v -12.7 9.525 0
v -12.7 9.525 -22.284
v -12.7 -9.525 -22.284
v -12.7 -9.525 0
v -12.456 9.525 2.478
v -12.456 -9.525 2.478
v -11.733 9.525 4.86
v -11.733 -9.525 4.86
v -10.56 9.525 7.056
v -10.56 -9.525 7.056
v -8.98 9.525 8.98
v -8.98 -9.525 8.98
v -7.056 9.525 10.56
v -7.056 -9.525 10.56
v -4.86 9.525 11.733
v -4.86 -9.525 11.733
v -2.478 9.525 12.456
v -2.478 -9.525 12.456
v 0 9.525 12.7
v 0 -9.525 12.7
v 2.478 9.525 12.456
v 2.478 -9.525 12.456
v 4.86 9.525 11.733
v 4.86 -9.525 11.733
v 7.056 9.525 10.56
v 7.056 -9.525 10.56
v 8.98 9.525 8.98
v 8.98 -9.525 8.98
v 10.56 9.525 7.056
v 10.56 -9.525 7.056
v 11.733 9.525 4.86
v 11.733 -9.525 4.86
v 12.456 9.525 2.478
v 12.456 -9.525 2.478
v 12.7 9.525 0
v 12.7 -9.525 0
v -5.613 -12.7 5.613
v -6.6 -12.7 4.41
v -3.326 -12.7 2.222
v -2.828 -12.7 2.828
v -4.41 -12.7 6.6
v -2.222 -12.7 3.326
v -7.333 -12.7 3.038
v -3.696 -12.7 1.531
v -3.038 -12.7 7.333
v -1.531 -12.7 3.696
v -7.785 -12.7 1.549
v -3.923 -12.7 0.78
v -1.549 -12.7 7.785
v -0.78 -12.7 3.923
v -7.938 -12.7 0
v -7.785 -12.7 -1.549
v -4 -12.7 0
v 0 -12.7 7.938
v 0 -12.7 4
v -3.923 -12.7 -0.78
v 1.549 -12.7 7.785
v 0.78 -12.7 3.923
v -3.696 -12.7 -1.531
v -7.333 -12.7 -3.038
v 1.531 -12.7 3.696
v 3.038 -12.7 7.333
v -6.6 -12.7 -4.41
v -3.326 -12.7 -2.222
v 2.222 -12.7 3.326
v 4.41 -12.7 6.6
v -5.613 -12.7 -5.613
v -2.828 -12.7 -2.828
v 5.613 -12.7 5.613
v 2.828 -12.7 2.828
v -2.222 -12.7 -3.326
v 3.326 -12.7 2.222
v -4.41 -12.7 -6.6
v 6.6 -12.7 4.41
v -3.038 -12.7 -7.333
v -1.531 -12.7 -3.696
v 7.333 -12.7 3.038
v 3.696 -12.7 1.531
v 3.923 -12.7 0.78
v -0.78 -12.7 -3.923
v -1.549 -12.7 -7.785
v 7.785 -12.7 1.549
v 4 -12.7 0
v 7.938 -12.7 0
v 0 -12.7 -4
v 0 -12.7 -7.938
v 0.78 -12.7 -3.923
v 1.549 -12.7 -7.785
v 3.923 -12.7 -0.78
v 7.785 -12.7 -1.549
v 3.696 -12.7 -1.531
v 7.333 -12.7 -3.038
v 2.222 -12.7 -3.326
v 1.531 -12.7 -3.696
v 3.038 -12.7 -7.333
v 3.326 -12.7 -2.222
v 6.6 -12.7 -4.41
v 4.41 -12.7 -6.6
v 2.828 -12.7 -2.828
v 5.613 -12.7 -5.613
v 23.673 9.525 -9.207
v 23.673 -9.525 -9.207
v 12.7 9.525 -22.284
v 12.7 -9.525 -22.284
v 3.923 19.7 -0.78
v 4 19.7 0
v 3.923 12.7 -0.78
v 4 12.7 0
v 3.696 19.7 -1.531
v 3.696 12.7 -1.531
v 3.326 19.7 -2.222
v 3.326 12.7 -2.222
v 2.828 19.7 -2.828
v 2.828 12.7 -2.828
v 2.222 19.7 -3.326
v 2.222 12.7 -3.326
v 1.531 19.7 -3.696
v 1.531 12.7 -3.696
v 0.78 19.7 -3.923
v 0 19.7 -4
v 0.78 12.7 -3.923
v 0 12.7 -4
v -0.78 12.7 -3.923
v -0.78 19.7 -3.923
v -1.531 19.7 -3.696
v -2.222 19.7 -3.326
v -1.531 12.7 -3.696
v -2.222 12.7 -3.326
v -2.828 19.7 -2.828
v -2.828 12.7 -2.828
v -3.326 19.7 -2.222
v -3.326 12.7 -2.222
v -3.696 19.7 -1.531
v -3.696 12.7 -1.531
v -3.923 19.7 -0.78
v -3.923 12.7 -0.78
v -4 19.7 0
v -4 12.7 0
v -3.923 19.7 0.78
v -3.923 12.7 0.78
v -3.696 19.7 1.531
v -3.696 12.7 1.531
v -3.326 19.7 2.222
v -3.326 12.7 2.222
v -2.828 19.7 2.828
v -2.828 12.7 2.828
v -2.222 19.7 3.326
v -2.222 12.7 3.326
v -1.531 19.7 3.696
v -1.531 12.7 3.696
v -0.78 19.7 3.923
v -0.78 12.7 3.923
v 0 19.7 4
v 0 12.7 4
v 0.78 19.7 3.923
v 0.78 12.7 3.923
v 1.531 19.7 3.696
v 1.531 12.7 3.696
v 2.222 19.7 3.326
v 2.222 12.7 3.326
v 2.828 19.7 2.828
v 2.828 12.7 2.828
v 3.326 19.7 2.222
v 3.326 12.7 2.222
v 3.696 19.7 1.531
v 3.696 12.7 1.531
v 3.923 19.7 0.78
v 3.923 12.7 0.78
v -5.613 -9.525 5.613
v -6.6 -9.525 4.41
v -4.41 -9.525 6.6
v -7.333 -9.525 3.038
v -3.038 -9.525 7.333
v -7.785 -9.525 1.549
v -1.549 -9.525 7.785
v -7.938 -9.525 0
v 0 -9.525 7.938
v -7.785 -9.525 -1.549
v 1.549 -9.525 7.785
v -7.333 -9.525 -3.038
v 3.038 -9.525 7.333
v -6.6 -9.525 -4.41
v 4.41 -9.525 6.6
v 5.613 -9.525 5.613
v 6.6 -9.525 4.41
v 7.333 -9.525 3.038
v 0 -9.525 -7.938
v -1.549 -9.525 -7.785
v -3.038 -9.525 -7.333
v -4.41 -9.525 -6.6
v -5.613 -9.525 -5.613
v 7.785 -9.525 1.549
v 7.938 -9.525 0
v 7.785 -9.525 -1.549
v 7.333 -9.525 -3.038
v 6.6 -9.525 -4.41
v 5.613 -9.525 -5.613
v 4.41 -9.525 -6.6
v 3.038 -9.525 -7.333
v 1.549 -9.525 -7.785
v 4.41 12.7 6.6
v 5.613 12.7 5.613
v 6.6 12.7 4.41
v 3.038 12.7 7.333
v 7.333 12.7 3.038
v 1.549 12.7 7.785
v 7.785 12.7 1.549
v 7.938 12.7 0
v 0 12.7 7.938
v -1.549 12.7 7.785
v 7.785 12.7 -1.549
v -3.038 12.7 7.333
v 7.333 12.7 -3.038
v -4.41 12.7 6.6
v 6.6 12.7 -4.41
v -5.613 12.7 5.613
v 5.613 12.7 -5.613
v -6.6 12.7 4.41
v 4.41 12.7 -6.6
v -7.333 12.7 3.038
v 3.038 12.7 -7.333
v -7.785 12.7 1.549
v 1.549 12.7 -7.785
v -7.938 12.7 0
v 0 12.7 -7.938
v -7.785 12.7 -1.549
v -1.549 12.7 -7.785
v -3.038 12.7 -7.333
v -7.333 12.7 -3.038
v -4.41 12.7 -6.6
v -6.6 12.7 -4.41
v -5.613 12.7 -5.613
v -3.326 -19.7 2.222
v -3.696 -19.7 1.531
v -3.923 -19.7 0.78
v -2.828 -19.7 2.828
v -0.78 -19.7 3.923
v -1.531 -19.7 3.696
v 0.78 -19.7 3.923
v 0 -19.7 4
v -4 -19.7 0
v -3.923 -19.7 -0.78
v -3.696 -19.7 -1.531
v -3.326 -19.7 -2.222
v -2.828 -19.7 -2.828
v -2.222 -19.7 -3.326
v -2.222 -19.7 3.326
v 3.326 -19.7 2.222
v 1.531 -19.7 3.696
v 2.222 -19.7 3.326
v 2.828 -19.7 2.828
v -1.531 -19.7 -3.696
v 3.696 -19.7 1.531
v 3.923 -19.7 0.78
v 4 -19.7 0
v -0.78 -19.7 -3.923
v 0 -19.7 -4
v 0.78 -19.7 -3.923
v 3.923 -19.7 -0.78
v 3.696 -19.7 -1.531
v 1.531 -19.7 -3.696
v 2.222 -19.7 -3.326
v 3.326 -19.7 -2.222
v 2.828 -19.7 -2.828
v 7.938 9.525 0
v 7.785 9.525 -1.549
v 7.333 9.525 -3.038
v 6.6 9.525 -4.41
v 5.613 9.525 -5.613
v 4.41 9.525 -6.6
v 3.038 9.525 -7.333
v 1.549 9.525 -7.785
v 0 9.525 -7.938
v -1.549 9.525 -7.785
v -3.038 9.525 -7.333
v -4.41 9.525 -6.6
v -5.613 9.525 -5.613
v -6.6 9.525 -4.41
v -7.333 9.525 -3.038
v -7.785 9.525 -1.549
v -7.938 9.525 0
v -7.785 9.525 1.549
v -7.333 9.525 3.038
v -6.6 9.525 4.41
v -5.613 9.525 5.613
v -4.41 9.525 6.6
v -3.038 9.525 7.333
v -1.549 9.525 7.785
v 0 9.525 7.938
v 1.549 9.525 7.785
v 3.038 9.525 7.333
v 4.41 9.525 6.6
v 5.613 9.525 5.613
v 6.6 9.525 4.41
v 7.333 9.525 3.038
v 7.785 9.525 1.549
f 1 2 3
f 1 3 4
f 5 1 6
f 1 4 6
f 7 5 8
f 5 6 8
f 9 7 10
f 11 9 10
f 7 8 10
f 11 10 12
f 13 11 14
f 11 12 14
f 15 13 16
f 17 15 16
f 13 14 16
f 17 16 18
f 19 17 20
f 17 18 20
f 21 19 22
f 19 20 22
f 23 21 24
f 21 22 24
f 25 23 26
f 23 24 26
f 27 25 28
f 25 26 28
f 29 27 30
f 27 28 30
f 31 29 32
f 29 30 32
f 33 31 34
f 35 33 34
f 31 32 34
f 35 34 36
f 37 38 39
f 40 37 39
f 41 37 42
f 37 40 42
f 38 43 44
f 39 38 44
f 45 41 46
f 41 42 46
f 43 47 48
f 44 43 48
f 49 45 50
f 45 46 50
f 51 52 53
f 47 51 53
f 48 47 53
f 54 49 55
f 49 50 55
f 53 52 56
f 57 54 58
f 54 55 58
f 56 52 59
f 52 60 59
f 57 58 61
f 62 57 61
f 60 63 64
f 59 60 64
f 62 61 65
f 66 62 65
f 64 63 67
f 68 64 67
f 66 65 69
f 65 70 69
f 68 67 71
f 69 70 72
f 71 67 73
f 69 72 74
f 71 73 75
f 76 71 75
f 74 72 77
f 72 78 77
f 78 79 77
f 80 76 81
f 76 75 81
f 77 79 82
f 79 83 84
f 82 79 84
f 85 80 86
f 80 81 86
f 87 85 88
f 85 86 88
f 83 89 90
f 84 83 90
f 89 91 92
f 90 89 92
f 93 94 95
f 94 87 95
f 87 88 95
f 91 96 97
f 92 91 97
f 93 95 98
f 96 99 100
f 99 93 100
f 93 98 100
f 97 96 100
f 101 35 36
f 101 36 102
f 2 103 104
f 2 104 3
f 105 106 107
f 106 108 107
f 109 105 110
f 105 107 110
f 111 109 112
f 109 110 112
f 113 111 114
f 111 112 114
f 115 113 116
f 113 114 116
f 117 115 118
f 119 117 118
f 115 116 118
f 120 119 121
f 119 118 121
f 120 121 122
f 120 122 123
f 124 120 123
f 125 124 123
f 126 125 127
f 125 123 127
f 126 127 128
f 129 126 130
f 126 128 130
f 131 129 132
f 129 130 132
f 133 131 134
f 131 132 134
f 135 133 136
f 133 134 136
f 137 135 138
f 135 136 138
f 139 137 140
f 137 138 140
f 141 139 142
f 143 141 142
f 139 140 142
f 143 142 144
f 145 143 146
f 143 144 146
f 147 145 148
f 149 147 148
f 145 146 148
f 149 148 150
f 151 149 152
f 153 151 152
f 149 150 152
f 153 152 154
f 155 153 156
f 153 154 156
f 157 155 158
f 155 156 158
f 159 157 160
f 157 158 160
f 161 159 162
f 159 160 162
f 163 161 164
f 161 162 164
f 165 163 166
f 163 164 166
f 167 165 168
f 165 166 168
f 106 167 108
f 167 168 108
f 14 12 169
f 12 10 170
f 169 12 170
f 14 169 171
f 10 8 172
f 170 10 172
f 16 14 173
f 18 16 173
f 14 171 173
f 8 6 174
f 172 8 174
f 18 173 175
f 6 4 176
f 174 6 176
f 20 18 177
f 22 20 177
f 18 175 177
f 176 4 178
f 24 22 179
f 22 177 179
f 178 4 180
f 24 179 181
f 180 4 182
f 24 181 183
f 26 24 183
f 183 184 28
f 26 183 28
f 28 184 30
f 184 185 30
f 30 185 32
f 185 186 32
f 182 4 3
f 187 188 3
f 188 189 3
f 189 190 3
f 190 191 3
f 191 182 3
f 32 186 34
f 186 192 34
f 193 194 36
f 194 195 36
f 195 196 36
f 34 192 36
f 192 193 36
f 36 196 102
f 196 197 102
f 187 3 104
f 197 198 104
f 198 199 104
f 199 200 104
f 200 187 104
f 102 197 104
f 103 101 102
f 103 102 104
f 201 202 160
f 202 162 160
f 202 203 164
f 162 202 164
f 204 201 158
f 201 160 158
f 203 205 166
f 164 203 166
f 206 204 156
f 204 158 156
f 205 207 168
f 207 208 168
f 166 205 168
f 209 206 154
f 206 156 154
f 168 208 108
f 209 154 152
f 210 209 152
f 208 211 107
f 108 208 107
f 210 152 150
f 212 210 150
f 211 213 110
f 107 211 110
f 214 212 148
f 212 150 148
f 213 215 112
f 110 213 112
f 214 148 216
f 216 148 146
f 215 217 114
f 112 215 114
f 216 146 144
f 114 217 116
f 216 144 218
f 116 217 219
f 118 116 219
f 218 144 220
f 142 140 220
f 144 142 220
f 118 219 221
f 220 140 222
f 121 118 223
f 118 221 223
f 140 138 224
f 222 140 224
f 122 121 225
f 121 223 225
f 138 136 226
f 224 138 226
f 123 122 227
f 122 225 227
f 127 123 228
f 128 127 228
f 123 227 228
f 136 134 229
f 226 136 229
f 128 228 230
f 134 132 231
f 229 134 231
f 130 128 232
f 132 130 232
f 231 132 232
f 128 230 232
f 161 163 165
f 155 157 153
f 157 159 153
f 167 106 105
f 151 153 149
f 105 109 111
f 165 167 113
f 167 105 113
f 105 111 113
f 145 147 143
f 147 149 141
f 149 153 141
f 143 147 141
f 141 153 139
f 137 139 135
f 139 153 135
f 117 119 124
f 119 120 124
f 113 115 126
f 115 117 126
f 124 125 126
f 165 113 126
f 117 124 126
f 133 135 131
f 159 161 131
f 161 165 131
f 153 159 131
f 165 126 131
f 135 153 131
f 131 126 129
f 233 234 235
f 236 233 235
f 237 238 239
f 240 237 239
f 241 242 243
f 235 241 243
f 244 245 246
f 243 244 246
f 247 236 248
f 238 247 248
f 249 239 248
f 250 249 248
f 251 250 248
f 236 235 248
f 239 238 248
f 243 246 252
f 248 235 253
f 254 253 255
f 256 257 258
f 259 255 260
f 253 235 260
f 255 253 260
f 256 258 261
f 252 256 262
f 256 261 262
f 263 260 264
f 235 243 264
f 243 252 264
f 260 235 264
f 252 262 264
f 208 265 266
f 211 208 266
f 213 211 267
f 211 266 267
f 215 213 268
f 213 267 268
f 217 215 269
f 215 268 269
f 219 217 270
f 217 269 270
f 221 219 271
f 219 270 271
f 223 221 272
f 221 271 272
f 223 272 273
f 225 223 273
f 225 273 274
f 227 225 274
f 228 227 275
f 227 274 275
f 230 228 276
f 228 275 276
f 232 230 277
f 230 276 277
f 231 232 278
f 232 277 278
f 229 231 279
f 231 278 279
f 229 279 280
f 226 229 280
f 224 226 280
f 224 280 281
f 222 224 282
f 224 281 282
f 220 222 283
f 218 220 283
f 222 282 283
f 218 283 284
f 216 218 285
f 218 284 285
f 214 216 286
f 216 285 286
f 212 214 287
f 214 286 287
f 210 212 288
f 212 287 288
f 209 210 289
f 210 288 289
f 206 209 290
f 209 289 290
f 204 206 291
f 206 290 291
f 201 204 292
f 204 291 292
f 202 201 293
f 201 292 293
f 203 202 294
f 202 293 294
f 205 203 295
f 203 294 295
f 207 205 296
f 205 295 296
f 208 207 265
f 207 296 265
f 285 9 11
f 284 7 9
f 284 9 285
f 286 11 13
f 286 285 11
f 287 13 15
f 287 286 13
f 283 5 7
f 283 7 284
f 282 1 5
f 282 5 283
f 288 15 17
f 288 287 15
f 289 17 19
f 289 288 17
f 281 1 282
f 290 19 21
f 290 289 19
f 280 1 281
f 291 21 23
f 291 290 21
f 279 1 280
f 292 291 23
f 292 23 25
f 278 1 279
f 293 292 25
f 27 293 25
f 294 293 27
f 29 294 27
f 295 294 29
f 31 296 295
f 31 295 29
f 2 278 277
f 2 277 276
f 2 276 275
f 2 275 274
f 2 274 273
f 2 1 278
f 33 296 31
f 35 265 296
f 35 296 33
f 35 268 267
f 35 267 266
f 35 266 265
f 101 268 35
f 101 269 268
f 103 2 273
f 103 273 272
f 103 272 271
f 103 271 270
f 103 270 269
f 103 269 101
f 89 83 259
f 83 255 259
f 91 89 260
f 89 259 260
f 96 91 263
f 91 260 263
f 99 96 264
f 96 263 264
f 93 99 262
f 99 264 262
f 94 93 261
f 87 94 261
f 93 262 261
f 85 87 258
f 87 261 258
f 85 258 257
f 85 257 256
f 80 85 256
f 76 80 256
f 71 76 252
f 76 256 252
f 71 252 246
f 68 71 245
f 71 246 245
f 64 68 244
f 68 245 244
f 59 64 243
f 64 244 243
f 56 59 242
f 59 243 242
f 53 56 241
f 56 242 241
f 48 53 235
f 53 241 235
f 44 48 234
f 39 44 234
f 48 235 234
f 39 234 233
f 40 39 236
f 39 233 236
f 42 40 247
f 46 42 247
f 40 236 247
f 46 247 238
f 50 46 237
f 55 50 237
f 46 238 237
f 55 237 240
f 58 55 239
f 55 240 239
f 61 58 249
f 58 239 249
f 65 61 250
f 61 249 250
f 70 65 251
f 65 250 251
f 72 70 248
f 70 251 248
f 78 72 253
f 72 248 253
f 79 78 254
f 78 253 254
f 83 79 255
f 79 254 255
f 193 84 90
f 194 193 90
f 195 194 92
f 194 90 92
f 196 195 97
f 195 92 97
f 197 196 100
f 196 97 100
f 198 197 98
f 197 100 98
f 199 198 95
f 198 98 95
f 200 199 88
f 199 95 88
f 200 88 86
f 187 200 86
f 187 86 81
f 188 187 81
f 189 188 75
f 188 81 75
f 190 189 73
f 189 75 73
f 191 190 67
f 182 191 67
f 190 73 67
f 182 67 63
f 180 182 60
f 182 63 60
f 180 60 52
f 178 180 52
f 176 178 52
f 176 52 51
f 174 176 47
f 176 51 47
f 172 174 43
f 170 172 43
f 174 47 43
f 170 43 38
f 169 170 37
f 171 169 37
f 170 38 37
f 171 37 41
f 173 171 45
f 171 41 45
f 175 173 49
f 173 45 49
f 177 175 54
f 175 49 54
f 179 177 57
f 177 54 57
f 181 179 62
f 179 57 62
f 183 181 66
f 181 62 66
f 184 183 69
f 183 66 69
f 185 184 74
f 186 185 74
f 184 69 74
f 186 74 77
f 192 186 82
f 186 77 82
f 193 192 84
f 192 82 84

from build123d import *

# Parameters (mm, degrees)
BOSS_EXTRUDE1_DEPTH = 19.05


with BuildPart() as part:
    # Sketch1 → Revolve1 (revolve)
    with BuildSketch(Plane.XY, mode=Mode.PRIVATE) as revolve1_sk:
        Polygon((-4, -19.7), (0, -19.7), (0, 19.7), (-4, 19.7), (-4, 12.7), (-7.9375, 12.7), (-7.9375, 9.525), (-12.7, 9.525), (-12.7, -9.525), (-7.9375, -9.525), (-7.9375, -12.7), (-4, -12.7), align=None)
    revolve(revolve1_sk.sketch.rotate(Axis((0, 0, 0), (0, 1, 0)), 180), axis=Axis((0, 0, 0), (0, 1, 0)))

    # Sketch2 → Boss-Extrude1 (add)
    with BuildSketch(Plane(origin=(0, 9.525, 0), x_dir=(1, 0, 0), z_dir=(0, 1, 0))):
        Polygon((12.7, 0), (23.672555951, 9.207067652), (12.7, 22.283650626), (-12.7, 22.283650626), (-12.7, 0), align=None)
    extrude(amount=-BOSS_EXTRUDE1_DEPTH)


solid = part.part
